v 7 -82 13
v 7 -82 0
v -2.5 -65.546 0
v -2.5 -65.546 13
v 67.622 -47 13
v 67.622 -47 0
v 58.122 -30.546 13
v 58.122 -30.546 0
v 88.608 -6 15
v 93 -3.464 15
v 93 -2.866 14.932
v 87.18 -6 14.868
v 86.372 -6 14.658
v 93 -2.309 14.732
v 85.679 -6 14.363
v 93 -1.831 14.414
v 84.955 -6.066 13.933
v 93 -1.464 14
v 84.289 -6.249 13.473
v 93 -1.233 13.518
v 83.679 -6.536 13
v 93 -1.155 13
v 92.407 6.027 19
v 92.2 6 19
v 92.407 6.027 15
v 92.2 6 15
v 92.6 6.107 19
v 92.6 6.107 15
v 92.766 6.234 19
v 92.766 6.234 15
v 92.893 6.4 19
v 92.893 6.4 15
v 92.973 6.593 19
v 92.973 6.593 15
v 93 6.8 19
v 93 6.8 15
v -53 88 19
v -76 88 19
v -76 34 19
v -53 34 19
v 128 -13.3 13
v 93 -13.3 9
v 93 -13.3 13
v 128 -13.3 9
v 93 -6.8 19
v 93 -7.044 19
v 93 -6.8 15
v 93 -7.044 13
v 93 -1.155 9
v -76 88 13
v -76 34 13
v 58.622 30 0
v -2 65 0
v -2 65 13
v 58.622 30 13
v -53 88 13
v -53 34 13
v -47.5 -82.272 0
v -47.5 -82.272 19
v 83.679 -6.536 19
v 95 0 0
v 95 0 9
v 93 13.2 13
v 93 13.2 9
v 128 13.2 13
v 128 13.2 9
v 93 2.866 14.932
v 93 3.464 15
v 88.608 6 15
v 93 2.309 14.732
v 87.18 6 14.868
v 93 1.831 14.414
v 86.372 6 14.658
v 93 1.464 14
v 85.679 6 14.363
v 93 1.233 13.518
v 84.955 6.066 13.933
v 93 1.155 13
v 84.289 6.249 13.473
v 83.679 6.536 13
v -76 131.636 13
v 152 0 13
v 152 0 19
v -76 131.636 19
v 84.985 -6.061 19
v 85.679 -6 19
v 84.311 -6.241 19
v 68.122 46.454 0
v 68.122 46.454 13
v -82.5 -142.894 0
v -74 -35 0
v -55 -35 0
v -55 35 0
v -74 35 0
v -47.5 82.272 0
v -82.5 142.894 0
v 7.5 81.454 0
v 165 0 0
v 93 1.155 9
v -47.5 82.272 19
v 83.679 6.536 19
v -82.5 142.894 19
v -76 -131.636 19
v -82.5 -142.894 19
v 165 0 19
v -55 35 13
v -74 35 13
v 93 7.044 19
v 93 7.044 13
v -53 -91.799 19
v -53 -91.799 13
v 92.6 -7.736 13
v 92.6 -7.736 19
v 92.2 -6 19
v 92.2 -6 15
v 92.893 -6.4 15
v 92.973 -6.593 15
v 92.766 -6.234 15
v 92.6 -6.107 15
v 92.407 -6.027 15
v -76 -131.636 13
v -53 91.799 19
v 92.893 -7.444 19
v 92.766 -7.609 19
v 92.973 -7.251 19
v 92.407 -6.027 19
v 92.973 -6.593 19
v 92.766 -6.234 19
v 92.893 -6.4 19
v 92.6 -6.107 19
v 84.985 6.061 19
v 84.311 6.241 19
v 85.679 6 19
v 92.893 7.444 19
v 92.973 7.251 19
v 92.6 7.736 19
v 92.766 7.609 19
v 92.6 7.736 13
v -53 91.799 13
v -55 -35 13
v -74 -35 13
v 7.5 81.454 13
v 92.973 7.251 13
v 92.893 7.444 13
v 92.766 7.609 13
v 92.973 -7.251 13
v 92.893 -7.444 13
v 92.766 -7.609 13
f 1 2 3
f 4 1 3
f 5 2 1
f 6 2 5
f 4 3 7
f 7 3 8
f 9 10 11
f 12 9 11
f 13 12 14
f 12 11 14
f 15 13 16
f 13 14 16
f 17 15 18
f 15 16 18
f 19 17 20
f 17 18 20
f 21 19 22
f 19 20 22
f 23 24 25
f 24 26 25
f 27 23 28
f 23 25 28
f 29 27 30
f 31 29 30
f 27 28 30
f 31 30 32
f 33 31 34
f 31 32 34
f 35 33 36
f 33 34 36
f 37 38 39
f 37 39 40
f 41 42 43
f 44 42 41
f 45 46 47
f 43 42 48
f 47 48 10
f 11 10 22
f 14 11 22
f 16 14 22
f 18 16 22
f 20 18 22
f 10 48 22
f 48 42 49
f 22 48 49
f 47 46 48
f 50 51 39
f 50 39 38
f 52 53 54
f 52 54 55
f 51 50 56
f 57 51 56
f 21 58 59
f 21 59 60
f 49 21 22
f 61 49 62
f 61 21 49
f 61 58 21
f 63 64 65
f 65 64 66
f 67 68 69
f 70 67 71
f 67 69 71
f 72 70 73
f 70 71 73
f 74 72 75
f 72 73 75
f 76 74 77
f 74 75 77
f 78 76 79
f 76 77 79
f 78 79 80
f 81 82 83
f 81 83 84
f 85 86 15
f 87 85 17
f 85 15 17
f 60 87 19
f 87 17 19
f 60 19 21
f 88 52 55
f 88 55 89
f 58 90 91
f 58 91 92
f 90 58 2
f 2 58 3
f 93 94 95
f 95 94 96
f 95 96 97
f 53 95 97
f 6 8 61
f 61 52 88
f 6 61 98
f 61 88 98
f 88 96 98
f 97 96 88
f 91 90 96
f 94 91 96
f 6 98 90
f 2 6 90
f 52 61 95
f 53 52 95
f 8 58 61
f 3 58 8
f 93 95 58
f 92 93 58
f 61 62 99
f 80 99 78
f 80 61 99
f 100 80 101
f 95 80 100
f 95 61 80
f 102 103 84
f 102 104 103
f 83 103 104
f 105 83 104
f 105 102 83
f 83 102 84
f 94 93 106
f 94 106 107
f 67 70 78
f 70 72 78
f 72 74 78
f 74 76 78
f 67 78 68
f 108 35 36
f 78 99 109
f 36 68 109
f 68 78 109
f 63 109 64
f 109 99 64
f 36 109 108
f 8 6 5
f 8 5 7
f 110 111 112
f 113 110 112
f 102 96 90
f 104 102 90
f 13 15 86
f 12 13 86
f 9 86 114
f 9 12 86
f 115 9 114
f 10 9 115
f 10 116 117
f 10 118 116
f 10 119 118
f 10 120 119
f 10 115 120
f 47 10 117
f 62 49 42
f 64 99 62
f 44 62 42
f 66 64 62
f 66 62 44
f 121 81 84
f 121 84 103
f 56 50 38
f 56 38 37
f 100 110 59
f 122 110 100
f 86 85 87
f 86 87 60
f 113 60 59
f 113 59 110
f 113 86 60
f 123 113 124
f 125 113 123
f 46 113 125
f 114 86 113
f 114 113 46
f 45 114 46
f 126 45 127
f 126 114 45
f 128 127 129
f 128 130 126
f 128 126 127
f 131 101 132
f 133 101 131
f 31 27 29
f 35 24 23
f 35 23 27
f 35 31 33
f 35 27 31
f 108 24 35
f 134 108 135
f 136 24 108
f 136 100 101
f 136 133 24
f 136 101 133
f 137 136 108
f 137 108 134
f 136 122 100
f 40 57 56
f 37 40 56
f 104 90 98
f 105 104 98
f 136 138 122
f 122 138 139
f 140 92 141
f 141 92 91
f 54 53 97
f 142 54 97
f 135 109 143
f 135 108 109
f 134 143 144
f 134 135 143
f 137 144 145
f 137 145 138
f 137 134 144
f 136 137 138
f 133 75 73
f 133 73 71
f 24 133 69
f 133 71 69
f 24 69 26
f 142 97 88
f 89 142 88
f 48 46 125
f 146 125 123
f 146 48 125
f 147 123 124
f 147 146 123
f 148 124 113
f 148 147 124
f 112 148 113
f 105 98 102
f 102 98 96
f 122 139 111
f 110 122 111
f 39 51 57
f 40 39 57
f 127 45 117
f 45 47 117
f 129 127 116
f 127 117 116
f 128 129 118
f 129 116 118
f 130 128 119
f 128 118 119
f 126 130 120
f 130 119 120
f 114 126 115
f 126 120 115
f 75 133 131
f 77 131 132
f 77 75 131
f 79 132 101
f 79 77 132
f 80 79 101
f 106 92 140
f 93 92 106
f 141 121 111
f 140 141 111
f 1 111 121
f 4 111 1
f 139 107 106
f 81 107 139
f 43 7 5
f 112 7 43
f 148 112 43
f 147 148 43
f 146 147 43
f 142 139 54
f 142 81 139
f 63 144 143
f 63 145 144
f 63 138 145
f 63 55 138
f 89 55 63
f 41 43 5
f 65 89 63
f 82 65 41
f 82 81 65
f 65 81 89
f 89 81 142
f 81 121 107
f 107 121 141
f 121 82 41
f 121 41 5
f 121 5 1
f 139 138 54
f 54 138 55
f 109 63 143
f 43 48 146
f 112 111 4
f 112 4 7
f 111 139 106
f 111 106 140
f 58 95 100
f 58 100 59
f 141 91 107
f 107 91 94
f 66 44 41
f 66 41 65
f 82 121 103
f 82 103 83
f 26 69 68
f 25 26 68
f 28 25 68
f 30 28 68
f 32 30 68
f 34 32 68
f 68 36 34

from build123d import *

# Parameters (mm, degrees)
BOX005_W               = 23
BOX005_H               = 54
BOX005_DEPTH           = 6
PRISM003_DEPTH         = 6
PRISM002_DEPTH         = 6
BOX004_W               = 10
BOX004_H               = 12
BOX004_DEPTH           = 4
BOX003_W               = 35
BOX003_H               = 26.5
BOX003_DEPTH           = 10
BOX002_W               = 70
BOX002_H               = 19
BOX002_DEPTH           = 19
BOX002_PLACEMENT_ANGLE = 30
BOX001_W               = 70
BOX001_H               = 19
BOX001_DEPTH           = 19
BOX001_PLACEMENT_ANGLE = 90
BOX_W                  = 70
BOX_H                  = 19
BOX_DEPTH              = 19
BOX_PLACEMENT_ANGLE    = 30
PRISM001_DEPTH         = 19
PRISM_DEPTH            = 19
FILLET_R               = 0.8
FILLET001_R            = 4
FILLET002_R            = 2


with BuildPart() as box005:
    # Box005 → Box005 (new body)
    with BuildSketch(Plane(origin=(-76, 34, 13), x_dir=(1, 0, 0), z_dir=(0, 0, 1))):
        with Locations((11.5, 27)):
            Rectangle(BOX005_W, BOX005_H)
    extrude(amount=BOX005_DEPTH)


with BuildPart() as prism003:
    # Prism003 → Prism003 (new body)
    with BuildSketch(Plane.XY.offset(13)):
        Polygon((106, 0), (-53, 91.798693), (-53, -91.798693), align=None)
    extrude(amount=PRISM003_DEPTH)


with BuildPart() as cut006:
    # Prism002 → Prism002 (new body)
    with BuildSketch(Plane.XY.offset(13)):
        Polygon((152, 0), (-76, 131.635861), (-76, -131.635861), align=None)
    extrude(amount=PRISM002_DEPTH)

    # Cut006: cut Prism003
    add(prism003.part, mode=Mode.SUBTRACT)


with BuildPart() as box004:
    # Box004 → Box004 (new body)
    with BuildSketch(Plane(origin=(84, -6, 15), x_dir=(1, 0, 0), z_dir=(0, 0, 1))):
        with Locations((5, 6)):
            Rectangle(BOX004_W, BOX004_H)
    extrude(amount=BOX004_DEPTH)


with BuildPart() as box003:
    # Box003 → Box003 (new body)
    with BuildSketch(Plane(origin=(93, -13.3, 9), x_dir=(1, 0, 0), z_dir=(0, 0, 1))):
        with Locations((17.5, 13.25)):
            Rectangle(BOX003_W, BOX003_H)
    extrude(amount=BOX003_DEPTH)


with BuildPart() as box002:
    # Box002 → Box002 (new body)
    with BuildSketch(Plane.XY):
        with Locations((35, 9.5)):
            Rectangle(BOX002_W, BOX002_H)
    extrude(amount=BOX002_DEPTH)


with BuildPart() as box002_1:
    # Box002 placement: moved
    add(box002.part.moved(Location((7, -82, 0))).rotate(Axis((7, -82, 0), (0, 0, 1)), BOX002_PLACEMENT_ANGLE))


with BuildPart() as box001:
    # Box001 → Box001 (new body)
    with BuildSketch(Plane.XY):
        with Locations((35, 9.5)):
            Rectangle(BOX001_W, BOX001_H)
    extrude(amount=BOX001_DEPTH)


with BuildPart() as box001_1:
    # Box001 placement: moved
    add(box001.part.moved(Location((-55, -35, 0))).rotate(Axis((-55, -35, 0), (0, 0, 1)), BOX001_PLACEMENT_ANGLE))


with BuildPart() as box:
    # Box → Box (new body)
    with BuildSketch(Plane.XY):
        with Locations((35, 9.5)):
            Rectangle(BOX_W, BOX_H)
    extrude(amount=BOX_DEPTH)


with BuildPart() as box_1:
    # Box placement: moved
    add(box.part.moved(Location((-2, 65, 0))).rotate(Axis((-2, 65, 0), (0, 0, -1)), BOX_PLACEMENT_ANGLE))


with BuildPart() as prism001:
    # Prism001 → Prism001 (new body)
    with BuildSketch(Plane.XY):
        Polygon((95, 0), (-47.5, 82.272413), (-47.5, -82.272413), align=None)
    extrude(amount=PRISM001_DEPTH)


with BuildPart() as fillet002:
    # Prism → Prism (new body)
    with BuildSketch(Plane.XY):
        Polygon((165, 0), (-82.5, 142.894192), (-82.5, -142.894192), align=None)
    extrude(amount=PRISM_DEPTH)

    # Cut: cut Prism001
    add(prism001.part, mode=Mode.SUBTRACT)

    # Cut001: cut Box
    add(box_1.part, mode=Mode.SUBTRACT)

    # Cut002: cut Box001
    add(box001_1.part, mode=Mode.SUBTRACT)

    # Cut003: cut Box002
    add(box002_1.part, mode=Mode.SUBTRACT)

    # Cut004: cut Box003
    add(box003.part, mode=Mode.SUBTRACT)

    # Cut005: cut Box004
    add(box004.part, mode=Mode.SUBTRACT)

    # Cut007: cut Cut006
    add(cut006.part, mode=Mode.SUBTRACT)

    # Fillet
    fillet_edges = [fillet002.edges().sort_by_distance(p)[0] for p in [
        (93, -6, 17),
        (93, -7.505553, 16),
        (93, 6, 17),
        (93, 7.505553, 16),
    ]]
    fillet(fillet_edges, radius=FILLET_R)

    # Fillet001
    fillet001_edges = [fillet002.edges().sort_by_distance(p)[0] for p in [
        (84.607695, 6, 17),
        (84.607695, -6, 17),
    ]]
    fillet(fillet001_edges, radius=FILLET001_R)

    # Fillet002
    fillet002_edges = [fillet002.edges().sort_by_distance(p)[0] for p in [
        (88.803848, 3.57735, 15),
        (88.803848, -3.57735, 15),
    ]]
    fillet(fillet002_edges, radius=FILLET002_R)


solid = Compound([box005.part, fillet002.part])
